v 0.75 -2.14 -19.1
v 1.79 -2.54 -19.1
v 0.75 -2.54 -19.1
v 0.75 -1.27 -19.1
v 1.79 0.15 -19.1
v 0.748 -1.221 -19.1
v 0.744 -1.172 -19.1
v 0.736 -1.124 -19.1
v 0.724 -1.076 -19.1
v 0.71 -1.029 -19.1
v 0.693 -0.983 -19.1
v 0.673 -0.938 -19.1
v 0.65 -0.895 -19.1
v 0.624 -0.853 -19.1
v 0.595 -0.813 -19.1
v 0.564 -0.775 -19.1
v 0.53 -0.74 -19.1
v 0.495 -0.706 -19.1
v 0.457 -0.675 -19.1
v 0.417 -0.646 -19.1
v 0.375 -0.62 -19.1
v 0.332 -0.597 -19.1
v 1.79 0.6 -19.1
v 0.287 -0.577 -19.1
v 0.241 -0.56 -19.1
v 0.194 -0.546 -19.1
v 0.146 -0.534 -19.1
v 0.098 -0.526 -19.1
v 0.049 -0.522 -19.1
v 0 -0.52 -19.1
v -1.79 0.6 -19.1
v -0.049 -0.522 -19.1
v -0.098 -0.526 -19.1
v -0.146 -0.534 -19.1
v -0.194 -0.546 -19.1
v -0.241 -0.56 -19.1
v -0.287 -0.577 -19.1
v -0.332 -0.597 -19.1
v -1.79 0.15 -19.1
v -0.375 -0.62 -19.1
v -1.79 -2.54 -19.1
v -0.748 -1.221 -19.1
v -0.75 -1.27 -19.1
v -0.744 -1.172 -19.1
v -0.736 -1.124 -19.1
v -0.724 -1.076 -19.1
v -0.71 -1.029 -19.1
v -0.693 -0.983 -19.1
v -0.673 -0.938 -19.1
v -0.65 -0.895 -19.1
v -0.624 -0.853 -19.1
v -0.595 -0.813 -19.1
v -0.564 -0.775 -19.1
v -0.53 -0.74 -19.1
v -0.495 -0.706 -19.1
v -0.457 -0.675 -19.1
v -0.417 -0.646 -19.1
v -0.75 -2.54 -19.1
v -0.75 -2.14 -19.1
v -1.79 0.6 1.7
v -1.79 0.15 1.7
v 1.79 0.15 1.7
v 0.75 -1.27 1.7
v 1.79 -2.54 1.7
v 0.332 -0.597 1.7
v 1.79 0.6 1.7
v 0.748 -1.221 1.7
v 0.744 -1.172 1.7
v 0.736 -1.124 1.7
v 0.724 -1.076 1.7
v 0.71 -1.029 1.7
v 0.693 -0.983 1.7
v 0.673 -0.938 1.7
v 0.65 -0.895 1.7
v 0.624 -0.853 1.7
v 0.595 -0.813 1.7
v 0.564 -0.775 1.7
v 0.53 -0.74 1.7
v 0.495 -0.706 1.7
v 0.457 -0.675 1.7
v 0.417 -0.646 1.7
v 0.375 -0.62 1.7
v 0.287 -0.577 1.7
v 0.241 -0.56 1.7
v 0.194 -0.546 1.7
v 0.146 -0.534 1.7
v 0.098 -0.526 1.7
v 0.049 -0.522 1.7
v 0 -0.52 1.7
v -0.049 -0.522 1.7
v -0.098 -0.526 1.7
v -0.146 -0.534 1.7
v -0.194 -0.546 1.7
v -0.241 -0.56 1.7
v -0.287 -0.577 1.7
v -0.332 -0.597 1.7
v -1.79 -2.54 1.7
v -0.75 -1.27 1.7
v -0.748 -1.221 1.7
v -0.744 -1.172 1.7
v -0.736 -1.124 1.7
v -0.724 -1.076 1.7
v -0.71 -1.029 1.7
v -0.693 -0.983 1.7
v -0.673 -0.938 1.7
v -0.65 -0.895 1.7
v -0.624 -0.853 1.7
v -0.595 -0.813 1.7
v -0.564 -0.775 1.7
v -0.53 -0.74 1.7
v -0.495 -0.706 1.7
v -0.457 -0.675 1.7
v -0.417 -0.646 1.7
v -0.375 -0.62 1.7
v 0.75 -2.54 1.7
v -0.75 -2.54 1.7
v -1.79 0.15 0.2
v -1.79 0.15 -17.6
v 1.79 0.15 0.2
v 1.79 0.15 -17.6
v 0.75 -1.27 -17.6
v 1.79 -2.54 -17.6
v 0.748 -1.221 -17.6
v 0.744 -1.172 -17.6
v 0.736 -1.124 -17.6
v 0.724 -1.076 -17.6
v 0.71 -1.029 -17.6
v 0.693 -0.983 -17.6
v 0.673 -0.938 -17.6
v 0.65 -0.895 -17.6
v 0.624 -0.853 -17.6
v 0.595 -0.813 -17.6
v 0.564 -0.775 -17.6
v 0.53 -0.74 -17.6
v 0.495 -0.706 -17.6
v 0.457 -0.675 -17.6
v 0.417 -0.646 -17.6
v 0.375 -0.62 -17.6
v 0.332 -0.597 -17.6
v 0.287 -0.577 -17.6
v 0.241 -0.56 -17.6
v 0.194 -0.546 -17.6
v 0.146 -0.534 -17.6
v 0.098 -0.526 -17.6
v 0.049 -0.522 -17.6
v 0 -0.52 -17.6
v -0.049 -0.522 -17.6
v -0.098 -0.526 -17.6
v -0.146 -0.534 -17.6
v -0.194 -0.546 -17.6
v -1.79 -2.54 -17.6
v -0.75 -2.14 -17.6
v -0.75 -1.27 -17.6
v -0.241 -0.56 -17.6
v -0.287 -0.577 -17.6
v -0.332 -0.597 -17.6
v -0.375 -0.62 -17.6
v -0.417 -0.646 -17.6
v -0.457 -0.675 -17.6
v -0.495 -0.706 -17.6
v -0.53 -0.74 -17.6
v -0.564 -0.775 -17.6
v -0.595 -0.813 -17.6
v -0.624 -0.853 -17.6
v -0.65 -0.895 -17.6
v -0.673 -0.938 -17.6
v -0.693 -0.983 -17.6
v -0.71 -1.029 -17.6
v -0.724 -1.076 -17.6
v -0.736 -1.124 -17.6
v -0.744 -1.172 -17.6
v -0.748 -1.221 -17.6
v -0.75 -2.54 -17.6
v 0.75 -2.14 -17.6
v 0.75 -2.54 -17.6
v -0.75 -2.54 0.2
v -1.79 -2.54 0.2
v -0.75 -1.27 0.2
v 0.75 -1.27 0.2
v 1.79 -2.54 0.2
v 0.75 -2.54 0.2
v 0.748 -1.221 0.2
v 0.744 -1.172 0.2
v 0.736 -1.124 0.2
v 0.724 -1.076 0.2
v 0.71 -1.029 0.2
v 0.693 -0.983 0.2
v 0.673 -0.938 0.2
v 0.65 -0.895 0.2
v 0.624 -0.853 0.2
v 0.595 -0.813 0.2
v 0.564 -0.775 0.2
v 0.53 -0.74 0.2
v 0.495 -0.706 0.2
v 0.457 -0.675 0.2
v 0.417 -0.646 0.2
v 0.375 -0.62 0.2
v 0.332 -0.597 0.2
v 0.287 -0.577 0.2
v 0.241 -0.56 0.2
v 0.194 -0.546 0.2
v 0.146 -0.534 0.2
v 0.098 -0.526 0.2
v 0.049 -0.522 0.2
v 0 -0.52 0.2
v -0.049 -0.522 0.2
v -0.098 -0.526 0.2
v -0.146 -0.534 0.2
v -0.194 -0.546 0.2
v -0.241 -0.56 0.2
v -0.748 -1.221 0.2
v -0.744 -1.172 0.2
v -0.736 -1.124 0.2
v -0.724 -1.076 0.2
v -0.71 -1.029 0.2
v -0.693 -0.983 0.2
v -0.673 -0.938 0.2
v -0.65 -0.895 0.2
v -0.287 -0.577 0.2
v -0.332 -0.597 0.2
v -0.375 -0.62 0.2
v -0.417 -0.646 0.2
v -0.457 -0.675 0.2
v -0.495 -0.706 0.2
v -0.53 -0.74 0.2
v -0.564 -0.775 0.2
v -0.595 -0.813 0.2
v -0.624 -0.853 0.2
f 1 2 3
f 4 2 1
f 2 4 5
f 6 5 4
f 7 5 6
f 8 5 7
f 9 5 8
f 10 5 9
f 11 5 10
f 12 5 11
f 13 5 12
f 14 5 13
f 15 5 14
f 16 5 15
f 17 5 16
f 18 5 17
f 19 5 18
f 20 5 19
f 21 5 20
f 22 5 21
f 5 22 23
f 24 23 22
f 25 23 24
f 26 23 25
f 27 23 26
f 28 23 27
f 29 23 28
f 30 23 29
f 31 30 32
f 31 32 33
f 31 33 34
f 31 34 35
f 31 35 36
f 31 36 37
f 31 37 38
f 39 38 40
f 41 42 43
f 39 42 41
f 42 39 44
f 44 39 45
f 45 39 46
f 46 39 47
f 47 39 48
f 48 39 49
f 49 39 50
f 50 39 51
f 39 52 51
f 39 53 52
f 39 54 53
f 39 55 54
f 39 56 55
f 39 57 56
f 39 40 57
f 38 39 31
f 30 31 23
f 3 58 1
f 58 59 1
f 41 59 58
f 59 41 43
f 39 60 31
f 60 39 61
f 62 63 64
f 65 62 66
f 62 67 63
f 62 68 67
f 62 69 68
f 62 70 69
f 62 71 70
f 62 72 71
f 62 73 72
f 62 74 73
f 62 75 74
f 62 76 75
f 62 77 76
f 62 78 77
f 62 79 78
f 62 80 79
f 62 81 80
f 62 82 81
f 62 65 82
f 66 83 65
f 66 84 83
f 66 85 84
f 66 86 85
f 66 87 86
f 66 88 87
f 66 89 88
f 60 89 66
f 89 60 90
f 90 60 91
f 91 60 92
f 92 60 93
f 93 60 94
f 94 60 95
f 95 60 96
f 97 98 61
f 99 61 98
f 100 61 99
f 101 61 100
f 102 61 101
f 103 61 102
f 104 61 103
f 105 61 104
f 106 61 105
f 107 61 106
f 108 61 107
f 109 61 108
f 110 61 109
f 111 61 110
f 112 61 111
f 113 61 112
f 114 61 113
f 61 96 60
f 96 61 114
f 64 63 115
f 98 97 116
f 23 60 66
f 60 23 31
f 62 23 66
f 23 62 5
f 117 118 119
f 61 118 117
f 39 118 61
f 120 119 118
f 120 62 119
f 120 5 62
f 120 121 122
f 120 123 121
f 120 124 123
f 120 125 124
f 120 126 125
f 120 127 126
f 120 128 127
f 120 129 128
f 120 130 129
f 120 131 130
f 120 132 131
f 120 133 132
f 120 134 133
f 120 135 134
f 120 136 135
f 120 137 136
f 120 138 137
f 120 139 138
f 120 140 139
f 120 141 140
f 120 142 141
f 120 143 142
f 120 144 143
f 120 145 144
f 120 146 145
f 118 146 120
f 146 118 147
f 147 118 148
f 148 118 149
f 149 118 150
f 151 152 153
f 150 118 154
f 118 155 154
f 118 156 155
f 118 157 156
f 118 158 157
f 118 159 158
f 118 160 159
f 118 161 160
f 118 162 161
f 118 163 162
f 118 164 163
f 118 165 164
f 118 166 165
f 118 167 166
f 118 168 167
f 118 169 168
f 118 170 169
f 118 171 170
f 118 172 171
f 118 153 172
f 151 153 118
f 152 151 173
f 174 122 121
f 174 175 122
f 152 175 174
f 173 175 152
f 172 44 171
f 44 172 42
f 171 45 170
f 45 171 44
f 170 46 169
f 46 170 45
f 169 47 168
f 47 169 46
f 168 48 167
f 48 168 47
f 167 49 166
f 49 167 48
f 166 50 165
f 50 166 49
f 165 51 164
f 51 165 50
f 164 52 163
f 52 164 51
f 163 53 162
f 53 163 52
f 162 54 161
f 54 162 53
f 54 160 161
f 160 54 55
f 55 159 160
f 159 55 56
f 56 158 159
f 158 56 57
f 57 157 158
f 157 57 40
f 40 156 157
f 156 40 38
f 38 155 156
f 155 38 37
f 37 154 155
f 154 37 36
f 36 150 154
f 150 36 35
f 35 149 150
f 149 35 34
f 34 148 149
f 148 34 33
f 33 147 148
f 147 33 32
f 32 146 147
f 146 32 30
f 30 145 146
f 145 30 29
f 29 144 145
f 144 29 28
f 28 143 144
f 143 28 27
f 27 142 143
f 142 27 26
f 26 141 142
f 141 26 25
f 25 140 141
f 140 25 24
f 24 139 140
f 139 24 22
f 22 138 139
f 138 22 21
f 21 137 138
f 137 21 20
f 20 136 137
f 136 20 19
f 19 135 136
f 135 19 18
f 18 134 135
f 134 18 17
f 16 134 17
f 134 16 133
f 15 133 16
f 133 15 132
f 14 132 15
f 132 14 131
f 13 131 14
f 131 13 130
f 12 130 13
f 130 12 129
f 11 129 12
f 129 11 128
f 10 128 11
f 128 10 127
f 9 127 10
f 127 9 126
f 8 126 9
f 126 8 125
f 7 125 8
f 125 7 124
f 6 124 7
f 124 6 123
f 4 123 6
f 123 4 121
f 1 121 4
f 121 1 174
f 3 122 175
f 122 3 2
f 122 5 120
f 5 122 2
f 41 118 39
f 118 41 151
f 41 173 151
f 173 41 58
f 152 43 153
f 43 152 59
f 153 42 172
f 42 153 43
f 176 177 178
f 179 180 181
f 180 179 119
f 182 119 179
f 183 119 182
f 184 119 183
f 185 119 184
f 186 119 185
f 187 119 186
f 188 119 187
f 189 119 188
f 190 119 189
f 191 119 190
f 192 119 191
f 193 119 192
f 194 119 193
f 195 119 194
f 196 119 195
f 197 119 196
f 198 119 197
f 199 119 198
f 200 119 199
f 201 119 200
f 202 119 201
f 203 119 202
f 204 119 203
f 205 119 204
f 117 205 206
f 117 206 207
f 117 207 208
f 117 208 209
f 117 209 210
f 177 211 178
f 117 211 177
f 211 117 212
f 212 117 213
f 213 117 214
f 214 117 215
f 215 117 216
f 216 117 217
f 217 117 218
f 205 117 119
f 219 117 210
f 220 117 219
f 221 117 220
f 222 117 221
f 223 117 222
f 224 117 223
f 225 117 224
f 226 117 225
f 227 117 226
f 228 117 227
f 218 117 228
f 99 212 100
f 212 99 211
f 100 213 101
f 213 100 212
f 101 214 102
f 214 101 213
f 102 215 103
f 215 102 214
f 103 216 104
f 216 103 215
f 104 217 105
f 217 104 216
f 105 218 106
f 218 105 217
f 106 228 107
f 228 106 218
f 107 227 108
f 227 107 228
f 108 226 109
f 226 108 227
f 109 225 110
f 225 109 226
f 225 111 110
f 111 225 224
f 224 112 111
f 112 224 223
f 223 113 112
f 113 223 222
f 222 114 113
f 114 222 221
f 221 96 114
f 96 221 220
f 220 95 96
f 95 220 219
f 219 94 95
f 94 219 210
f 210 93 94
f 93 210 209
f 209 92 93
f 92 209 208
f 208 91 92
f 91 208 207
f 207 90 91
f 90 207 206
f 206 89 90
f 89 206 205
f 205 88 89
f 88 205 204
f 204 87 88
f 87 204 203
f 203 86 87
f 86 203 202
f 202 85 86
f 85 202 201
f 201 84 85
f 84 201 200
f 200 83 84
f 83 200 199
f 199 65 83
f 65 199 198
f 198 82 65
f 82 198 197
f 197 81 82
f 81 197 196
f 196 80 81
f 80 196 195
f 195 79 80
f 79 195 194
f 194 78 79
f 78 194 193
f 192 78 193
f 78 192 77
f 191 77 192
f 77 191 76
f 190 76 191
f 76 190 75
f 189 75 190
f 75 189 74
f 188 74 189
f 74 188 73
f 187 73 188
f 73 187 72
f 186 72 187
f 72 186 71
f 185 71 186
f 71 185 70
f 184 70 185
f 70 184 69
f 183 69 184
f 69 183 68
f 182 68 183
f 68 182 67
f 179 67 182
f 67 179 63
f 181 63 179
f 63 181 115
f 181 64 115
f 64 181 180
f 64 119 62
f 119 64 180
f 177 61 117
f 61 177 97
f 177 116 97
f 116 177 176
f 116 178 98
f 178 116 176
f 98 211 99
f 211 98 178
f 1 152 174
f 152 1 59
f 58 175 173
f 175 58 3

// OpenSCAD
// PinHeaderClip v4 - "clipsingle"
// Reverse-engineered from clipsingle.3mf.
//
// The part is a little BRIDGE / staple:
//   * a thin top slab spanning the full length and width, and
//   * a foot at each end that drops down to the base, with a
//     semicircular arch tunnel through it (the pin channel).
// Between the two feet the underside is open - only the top slab spans.
//
// Coordinates are kept identical to the source model so this file is a
// drop-in match (X = width, Y = height, Z = length).

$fn = 96;

// ---- parameters (mm) --------------------------------------------------
half_w    = 1.27;     // half of the 2.54 mm (0.1") width
y_bottom  = -2.54;    // underside of the feet / open mouth of the slot
y_slab    =  0.15;    // underside of the top slab
y_top     =  0.60;    // top surface (flat over the whole length)

slot_r    =  0.75;    // radius of the arch / pin channel
slot_cy   = -1.27;    // centre height of the arch semicircle

foot_len  =  1.50;    // length of each end foot
span      = 17.80;    // clear length between the two feet (the measured gap)
z_start   = -19.10;   // keeps the original coordinate origin
z_end     = z_start + span + 2 * foot_len;   // = 1.70 at span = 17.80

// ---- options ----------------------------------------------------------
close_foot    = "start";   // close one foot into a stop: "start", "end" or "none"
cap_thickness = 0.40;      // thickness of that closing wall

count = 1;                 // number of clips side-by-side. They share walls
                           // at the 2.54 mm pitch so the long side faces
                           // touch -> one solid multi-way header clip.

equal_end_tines = true;    // pad the two outer tines so they are as wide as
                           // the (doubled) shared tines in the middle.

pitch   = 2 * half_w;      // 2.54 mm  (channel pitch)
wall    = half_w - slot_r; // one channel side-wall = half a middle tine (0.52)
strip_w = count * pitch;   // pitch-defined width (channels stay on 2.54 grid)
total_w = strip_w + (equal_end_tines ? 2 * wall : 0);   // padded overall width

// ---- 2D cross sections (whole strip, count cells wide) ----------------
// One pin channel (bottom-open, round-topped slot).
module slot_2d() {
    union() {
        translate([-slot_r, y_bottom])
            square([2 * slot_r, slot_cy - y_bottom]);   // straight walls
        translate([0, slot_cy])
            circle(r = slot_r);                         // round top
    }
}

// All channels across the strip.
module slots_2d() {
    for (i = [0 : count - 1])
        translate([(i - (count - 1) / 2) * pitch, 0])
            slot_2d();
}

// Foot: full strip rectangle with every channel removed.
module arch_profile() {
    difference() {
        translate([-total_w / 2, y_bottom])
            square([total_w, y_top - y_bottom]);
        slots_2d();
    }
}

// Middle: only the thin top slab.
module slab_profile() {
    translate([-total_w / 2, y_slab])
        square([total_w, y_top - y_slab]);
}

// Full solid cross section (used to close a foot).
module body_profile() {
    translate([-total_w / 2, y_bottom])
        square([total_w, y_top - y_bottom]);
}

// Thin floor that bridges the fork tines, closing the mouth of each channel.
module mouth_fill_2d() {
    for (i = [0 : count - 1])
        translate([(i - (count - 1) / 2) * pitch, 0])
            translate([-slot_r, y_bottom])
                square([2 * slot_r, cap_thickness]);
}

// ---- assembly (profiles extruded along Z = length) --------------------
module pin_header_clip() {
    // top slab, full length
    translate([0, 0, z_start])
        linear_extrude(height = z_end - z_start) slab_profile();

    // foot at each end
    translate([0, 0, z_start])
        linear_extrude(height = foot_len) arch_profile();
    translate([0, 0, z_end - foot_len])
        linear_extrude(height = foot_len) arch_profile();

    // close one foot: bridge the fork tines by flooring the mouth of each
    // channel (a thin surface across the slot opening, thickness cap_thickness).
    // The arch shape and the end faces stay untouched.
    if (close_foot == "start")
        translate([0, 0, z_start])
            linear_extrude(height = foot_len) mouth_fill_2d();
    else if (close_foot == "end")
        translate([0, 0, z_end - foot_len])
            linear_extrude(height = foot_len) mouth_fill_2d();
}

pin_header_clip();
